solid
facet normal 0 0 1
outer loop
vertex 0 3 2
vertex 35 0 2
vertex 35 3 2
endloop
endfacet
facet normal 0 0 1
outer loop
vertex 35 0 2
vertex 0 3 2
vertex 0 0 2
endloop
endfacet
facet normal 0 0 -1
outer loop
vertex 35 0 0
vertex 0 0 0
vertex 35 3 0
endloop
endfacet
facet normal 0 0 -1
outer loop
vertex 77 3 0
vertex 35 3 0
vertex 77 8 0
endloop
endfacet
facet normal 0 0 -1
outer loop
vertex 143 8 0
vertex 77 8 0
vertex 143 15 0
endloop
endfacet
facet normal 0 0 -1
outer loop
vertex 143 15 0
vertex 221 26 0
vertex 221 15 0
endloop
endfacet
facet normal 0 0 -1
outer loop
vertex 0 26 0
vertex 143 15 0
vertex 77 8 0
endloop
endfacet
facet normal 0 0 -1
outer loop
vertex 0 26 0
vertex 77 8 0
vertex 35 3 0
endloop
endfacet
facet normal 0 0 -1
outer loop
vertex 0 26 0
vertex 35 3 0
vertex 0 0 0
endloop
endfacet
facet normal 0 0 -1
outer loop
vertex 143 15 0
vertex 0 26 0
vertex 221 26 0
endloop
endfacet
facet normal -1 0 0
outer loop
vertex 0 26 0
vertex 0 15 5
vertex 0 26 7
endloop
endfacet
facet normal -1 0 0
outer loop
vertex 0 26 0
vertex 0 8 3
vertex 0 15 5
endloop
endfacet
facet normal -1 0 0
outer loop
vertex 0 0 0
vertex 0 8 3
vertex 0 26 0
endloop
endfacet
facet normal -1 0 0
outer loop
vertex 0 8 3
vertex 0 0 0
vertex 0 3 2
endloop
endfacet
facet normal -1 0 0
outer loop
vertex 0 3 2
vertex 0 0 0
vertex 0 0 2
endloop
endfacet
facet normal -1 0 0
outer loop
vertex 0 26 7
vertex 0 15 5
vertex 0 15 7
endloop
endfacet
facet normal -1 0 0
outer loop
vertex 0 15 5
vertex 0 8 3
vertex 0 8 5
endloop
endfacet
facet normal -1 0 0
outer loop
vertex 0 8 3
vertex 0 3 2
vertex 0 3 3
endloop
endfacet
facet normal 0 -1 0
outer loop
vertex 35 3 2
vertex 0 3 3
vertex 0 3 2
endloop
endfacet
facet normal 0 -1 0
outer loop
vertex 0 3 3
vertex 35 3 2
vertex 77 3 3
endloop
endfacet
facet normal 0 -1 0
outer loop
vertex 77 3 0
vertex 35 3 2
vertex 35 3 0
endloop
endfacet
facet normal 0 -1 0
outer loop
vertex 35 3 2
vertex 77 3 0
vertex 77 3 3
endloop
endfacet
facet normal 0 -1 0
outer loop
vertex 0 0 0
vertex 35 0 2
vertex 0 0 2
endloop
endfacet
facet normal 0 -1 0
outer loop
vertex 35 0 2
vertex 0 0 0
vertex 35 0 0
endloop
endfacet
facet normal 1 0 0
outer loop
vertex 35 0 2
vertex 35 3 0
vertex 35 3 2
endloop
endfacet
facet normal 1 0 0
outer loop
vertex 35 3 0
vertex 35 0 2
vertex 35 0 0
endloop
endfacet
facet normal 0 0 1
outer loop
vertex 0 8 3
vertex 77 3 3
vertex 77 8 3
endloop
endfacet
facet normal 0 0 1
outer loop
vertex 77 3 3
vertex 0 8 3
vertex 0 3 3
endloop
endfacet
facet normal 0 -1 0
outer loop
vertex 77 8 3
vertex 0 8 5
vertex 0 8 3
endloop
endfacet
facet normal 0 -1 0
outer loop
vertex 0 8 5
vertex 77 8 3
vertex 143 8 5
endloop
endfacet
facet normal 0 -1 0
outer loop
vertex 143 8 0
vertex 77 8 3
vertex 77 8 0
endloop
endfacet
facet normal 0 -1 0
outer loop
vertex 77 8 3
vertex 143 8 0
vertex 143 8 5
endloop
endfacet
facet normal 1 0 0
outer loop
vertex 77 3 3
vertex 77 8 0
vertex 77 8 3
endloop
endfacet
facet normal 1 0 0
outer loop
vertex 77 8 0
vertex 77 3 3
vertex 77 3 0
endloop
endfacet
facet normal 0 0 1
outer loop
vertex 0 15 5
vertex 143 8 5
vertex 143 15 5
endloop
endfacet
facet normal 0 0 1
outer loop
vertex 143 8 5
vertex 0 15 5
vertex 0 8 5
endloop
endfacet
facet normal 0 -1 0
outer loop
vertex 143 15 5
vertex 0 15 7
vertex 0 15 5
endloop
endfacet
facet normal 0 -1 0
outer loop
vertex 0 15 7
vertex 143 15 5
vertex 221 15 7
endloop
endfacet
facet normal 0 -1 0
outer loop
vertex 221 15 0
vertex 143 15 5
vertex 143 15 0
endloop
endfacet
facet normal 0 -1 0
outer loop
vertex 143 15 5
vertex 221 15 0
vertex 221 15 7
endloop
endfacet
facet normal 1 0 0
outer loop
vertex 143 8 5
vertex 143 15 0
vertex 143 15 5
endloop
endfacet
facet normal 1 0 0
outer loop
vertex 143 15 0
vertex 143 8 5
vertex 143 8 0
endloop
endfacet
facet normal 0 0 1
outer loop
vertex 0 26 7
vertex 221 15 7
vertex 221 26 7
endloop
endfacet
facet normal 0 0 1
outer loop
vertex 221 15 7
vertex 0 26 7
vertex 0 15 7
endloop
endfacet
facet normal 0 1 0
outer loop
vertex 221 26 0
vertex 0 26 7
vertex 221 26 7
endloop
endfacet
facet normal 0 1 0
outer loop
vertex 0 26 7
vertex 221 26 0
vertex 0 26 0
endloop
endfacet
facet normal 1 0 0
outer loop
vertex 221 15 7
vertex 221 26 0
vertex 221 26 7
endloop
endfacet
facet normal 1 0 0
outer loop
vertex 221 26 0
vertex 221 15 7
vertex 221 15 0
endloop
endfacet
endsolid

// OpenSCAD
translate([2.5, 1.5, 1.0]) color([0.7179182565245089, 0.9462539572878983, 0.537870455736408]) cube([5, 3, 2], center=true);
translate([7.5, 1.5, 1.0]) color([0.5545598515713968, 0.9900903354753839, 0.18998827565888077]) cube([5, 3, 2], center=true);
translate([12.5, 1.5, 1.0]) color([0.7825904371715813, 0.7915138240285756, 0.8447416276181308]) cube([5, 3, 2], center=true);
translate([17.5, 1.5, 1.0]) color([0.7500527092169327, 0.15533301818854706, 0.661127632121674]) cube([5, 3, 2], center=true);
translate([22.5, 1.5, 1.0]) color([0.9237031845862264, 0.5632851524959844, 0.3609415103802872]) cube([5, 3, 2], center=true);
translate([27.5, 1.5, 1.0]) color([0.9495201486078587, 0.5615986504586717, 0.41163639453549183]) cube([5, 3, 2], center=true);
translate([32.5, 1.5, 1.0]) color([0.6141334980612769, 0.8041250166314531, 0.22830209061365048]) cube([5, 3, 2], center=true);
translate([3.5, 5.5, 1.5]) color([0.01569204302297844, 0.5290948970731422, 0.9413574200758085]) cube([7, 5, 3], center=true);
translate([10.5, 5.5, 1.5]) color([0.6802579626031922, 0.6309080001300065, 0.6278151474899732]) cube([7, 5, 3], center=true);
translate([17.5, 5.5, 1.5]) color([0.4969897122617175, 0.7309192697350546, 0.2491944400337247]) cube([7, 5, 3], center=true);
translate([24.5, 5.5, 1.5]) color([0.891754263952968, 0.2744726552452267, 0.9449450132107339]) cube([7, 5, 3], center=true);
translate([31.5, 5.5, 1.5]) color([0.9264967100320902, 0.07792452404752792, 0.44817970124433604]) cube([7, 5, 3], center=true);
translate([38.5, 5.5, 1.5]) color([0.7440362849370825, 0.44965407150807035, 0.5088990248364155]) cube([7, 5, 3], center=true);
translate([45.5, 5.5, 1.5]) color([0.8068239376717178, 0.7049921609492721, 0.9580042227229432]) cube([7, 5, 3], center=true);
translate([52.5, 5.5, 1.5]) color([0.16448599428307875, 0.9235592861863212, 0.9279862525071727]) cube([7, 5, 3], center=true);
translate([59.5, 5.5, 1.5]) color([0.6347489386405218, 0.9403908272970672, 0.25268558738542024]) cube([7, 5, 3], center=true);
translate([66.5, 5.5, 1.5]) color([0.8817872834036474, 0.7734792929601902, 0.6096889997106941]) cube([7, 5, 3], center=true);
translate([73.5, 5.5, 1.5]) color([0.09062924464806255, 0.030134353730962182, 0.01096949549411852]) cube([7, 5, 3], center=true);
translate([5.5, 11.5, 2.5]) color([0.2505580574481764, 0.7623524099431817, 0.3866250323922331]) cube([11, 7, 5], center=true);
translate([16.5, 11.5, 2.5]) color([0.7754467251552132, 0.6256424909314248, 0.3892618991218443]) cube([11, 7, 5], center=true);
translate([27.5, 11.5, 2.5]) color([0.8801466287862422, 0.03841723935819574, 0.465312990207844]) cube([11, 7, 5], center=true);
translate([38.5, 11.5, 2.5]) color([0.8298523393928158, 0.12681348297309336, 0.7104875615116192]) cube([11, 7, 5], center=true);
translate([49.5, 11.5, 2.5]) color([0.32811584191028165, 0.02430127857694553, 0.4737249308893109]) cube([11, 7, 5], center=true);
translate([60.5, 11.5, 2.5]) color([0.521692738945335, 0.04158625067384558, 0.5659193535517807]) cube([11, 7, 5], center=true);
translate([71.5, 11.5, 2.5]) color([0.34743383795783944, 0.004493207256296983, 0.19077338067656535]) cube([11, 7, 5], center=true);
translate([82.5, 11.5, 2.5]) color([0.11081067227867492, 0.5406219547324049, 0.043120163042338455]) cube([11, 7, 5], center=true);
translate([93.5, 11.5, 2.5]) color([0.9281325700980793, 0.8450619723983726, 0.9452976437314561]) cube([11, 7, 5], center=true);
translate([104.5, 11.5, 2.5]) color([0.31480103278643345, 0.9052673885618943, 0.984312422520035]) cube([11, 7, 5], center=true);
translate([115.5, 11.5, 2.5]) color([0.7647314342526466, 0.2750826135755835, 0.6708893041471536]) cube([11, 7, 5], center=true);
translate([126.5, 11.5, 2.5]) color([0.5956631537339799, 0.40420330216444333, 0.3060978540144266]) cube([11, 7, 5], center=true);
translate([137.5, 11.5, 2.5]) color([0.059848190567730275, 0.12538247475645914, 0.13395615600511968]) cube([11, 7, 5], center=true);
translate([6.5, 20.5, 3.5]) color([0.48089286465431025, 0.6418933847268948, 0.7640684524444807]) cube([13, 11, 7], center=true);
translate([19.5, 20.5, 3.5]) color([0.046713759972221824, 0.8237598726124178, 0.04347122329095843]) cube([13, 11, 7], center=true);
translate([32.5, 20.5, 3.5]) color([0.5549468300580123, 0.7441478498080107, 0.631221371794228]) cube([13, 11, 7], center=true);
translate([45.5, 20.5, 3.5]) color([0.949678675683002, 0.3446983531128357, 0.5858833552375392]) cube([13, 11, 7], center=true);
translate([58.5, 20.5, 3.5]) color([0.08279906273431636, 0.5597965879322987, 0.8132988010762888]) cube([13, 11, 7], center=true);
translate([71.5, 20.5, 3.5]) color([0.20160451382548072, 0.26096450036718066, 0.7004056402196938]) cube([13, 11, 7], center=true);
translate([84.5, 20.5, 3.5]) color([0.25388196693606324, 0.25924547402140496, 0.9355152879393015]) cube([13, 11, 7], center=true);
translate([97.5, 20.5, 3.5]) color([0.9985430308431146, 0.15519843069219807, 0.9001623872580004]) cube([13, 11, 7], center=true);
translate([110.5, 20.5, 3.5]) color([0.552726485973739, 0.038601142410517486, 0.5855027152371853]) cube([13, 11, 7], center=true);
translate([123.5, 20.5, 3.5]) color([0.641549650670755, 0.0337956987021093, 0.7576919221586004]) cube([13, 11, 7], center=true);
translate([136.5, 20.5, 3.5]) color([0.817800141474185, 0.07164324218695617, 0.6483999400661788]) cube([13, 11, 7], center=true);
translate([149.5, 20.5, 3.5]) color([0.4565474809027662, 0.2387212873419211, 0.4586703816224843]) cube([13, 11, 7], center=true);
translate([162.5, 20.5, 3.5]) color([0.15938970975228217, 0.33366590673229635, 0.6552072997009475]) cube([13, 11, 7], center=true);
translate([175.5, 20.5, 3.5]) color([0.4764855561518734, 0.5559200946775417, 0.5434427938045303]) cube([13, 11, 7], center=true);
translate([188.5, 20.5, 3.5]) color([0.8205942401116392, 0.3433827981536126, 0.8129620907818157]) cube([13, 11, 7], center=true);
translate([201.5, 20.5, 3.5]) color([0.07998708713040747, 0.4277330458726053, 0.352320116536872]) cube([13, 11, 7], center=true);
translate([214.5, 20.5, 3.5]) color([0.451580638705249, 0.8335098205362665, 0.5123994004879511]) cube([13, 11, 7], center=true);
